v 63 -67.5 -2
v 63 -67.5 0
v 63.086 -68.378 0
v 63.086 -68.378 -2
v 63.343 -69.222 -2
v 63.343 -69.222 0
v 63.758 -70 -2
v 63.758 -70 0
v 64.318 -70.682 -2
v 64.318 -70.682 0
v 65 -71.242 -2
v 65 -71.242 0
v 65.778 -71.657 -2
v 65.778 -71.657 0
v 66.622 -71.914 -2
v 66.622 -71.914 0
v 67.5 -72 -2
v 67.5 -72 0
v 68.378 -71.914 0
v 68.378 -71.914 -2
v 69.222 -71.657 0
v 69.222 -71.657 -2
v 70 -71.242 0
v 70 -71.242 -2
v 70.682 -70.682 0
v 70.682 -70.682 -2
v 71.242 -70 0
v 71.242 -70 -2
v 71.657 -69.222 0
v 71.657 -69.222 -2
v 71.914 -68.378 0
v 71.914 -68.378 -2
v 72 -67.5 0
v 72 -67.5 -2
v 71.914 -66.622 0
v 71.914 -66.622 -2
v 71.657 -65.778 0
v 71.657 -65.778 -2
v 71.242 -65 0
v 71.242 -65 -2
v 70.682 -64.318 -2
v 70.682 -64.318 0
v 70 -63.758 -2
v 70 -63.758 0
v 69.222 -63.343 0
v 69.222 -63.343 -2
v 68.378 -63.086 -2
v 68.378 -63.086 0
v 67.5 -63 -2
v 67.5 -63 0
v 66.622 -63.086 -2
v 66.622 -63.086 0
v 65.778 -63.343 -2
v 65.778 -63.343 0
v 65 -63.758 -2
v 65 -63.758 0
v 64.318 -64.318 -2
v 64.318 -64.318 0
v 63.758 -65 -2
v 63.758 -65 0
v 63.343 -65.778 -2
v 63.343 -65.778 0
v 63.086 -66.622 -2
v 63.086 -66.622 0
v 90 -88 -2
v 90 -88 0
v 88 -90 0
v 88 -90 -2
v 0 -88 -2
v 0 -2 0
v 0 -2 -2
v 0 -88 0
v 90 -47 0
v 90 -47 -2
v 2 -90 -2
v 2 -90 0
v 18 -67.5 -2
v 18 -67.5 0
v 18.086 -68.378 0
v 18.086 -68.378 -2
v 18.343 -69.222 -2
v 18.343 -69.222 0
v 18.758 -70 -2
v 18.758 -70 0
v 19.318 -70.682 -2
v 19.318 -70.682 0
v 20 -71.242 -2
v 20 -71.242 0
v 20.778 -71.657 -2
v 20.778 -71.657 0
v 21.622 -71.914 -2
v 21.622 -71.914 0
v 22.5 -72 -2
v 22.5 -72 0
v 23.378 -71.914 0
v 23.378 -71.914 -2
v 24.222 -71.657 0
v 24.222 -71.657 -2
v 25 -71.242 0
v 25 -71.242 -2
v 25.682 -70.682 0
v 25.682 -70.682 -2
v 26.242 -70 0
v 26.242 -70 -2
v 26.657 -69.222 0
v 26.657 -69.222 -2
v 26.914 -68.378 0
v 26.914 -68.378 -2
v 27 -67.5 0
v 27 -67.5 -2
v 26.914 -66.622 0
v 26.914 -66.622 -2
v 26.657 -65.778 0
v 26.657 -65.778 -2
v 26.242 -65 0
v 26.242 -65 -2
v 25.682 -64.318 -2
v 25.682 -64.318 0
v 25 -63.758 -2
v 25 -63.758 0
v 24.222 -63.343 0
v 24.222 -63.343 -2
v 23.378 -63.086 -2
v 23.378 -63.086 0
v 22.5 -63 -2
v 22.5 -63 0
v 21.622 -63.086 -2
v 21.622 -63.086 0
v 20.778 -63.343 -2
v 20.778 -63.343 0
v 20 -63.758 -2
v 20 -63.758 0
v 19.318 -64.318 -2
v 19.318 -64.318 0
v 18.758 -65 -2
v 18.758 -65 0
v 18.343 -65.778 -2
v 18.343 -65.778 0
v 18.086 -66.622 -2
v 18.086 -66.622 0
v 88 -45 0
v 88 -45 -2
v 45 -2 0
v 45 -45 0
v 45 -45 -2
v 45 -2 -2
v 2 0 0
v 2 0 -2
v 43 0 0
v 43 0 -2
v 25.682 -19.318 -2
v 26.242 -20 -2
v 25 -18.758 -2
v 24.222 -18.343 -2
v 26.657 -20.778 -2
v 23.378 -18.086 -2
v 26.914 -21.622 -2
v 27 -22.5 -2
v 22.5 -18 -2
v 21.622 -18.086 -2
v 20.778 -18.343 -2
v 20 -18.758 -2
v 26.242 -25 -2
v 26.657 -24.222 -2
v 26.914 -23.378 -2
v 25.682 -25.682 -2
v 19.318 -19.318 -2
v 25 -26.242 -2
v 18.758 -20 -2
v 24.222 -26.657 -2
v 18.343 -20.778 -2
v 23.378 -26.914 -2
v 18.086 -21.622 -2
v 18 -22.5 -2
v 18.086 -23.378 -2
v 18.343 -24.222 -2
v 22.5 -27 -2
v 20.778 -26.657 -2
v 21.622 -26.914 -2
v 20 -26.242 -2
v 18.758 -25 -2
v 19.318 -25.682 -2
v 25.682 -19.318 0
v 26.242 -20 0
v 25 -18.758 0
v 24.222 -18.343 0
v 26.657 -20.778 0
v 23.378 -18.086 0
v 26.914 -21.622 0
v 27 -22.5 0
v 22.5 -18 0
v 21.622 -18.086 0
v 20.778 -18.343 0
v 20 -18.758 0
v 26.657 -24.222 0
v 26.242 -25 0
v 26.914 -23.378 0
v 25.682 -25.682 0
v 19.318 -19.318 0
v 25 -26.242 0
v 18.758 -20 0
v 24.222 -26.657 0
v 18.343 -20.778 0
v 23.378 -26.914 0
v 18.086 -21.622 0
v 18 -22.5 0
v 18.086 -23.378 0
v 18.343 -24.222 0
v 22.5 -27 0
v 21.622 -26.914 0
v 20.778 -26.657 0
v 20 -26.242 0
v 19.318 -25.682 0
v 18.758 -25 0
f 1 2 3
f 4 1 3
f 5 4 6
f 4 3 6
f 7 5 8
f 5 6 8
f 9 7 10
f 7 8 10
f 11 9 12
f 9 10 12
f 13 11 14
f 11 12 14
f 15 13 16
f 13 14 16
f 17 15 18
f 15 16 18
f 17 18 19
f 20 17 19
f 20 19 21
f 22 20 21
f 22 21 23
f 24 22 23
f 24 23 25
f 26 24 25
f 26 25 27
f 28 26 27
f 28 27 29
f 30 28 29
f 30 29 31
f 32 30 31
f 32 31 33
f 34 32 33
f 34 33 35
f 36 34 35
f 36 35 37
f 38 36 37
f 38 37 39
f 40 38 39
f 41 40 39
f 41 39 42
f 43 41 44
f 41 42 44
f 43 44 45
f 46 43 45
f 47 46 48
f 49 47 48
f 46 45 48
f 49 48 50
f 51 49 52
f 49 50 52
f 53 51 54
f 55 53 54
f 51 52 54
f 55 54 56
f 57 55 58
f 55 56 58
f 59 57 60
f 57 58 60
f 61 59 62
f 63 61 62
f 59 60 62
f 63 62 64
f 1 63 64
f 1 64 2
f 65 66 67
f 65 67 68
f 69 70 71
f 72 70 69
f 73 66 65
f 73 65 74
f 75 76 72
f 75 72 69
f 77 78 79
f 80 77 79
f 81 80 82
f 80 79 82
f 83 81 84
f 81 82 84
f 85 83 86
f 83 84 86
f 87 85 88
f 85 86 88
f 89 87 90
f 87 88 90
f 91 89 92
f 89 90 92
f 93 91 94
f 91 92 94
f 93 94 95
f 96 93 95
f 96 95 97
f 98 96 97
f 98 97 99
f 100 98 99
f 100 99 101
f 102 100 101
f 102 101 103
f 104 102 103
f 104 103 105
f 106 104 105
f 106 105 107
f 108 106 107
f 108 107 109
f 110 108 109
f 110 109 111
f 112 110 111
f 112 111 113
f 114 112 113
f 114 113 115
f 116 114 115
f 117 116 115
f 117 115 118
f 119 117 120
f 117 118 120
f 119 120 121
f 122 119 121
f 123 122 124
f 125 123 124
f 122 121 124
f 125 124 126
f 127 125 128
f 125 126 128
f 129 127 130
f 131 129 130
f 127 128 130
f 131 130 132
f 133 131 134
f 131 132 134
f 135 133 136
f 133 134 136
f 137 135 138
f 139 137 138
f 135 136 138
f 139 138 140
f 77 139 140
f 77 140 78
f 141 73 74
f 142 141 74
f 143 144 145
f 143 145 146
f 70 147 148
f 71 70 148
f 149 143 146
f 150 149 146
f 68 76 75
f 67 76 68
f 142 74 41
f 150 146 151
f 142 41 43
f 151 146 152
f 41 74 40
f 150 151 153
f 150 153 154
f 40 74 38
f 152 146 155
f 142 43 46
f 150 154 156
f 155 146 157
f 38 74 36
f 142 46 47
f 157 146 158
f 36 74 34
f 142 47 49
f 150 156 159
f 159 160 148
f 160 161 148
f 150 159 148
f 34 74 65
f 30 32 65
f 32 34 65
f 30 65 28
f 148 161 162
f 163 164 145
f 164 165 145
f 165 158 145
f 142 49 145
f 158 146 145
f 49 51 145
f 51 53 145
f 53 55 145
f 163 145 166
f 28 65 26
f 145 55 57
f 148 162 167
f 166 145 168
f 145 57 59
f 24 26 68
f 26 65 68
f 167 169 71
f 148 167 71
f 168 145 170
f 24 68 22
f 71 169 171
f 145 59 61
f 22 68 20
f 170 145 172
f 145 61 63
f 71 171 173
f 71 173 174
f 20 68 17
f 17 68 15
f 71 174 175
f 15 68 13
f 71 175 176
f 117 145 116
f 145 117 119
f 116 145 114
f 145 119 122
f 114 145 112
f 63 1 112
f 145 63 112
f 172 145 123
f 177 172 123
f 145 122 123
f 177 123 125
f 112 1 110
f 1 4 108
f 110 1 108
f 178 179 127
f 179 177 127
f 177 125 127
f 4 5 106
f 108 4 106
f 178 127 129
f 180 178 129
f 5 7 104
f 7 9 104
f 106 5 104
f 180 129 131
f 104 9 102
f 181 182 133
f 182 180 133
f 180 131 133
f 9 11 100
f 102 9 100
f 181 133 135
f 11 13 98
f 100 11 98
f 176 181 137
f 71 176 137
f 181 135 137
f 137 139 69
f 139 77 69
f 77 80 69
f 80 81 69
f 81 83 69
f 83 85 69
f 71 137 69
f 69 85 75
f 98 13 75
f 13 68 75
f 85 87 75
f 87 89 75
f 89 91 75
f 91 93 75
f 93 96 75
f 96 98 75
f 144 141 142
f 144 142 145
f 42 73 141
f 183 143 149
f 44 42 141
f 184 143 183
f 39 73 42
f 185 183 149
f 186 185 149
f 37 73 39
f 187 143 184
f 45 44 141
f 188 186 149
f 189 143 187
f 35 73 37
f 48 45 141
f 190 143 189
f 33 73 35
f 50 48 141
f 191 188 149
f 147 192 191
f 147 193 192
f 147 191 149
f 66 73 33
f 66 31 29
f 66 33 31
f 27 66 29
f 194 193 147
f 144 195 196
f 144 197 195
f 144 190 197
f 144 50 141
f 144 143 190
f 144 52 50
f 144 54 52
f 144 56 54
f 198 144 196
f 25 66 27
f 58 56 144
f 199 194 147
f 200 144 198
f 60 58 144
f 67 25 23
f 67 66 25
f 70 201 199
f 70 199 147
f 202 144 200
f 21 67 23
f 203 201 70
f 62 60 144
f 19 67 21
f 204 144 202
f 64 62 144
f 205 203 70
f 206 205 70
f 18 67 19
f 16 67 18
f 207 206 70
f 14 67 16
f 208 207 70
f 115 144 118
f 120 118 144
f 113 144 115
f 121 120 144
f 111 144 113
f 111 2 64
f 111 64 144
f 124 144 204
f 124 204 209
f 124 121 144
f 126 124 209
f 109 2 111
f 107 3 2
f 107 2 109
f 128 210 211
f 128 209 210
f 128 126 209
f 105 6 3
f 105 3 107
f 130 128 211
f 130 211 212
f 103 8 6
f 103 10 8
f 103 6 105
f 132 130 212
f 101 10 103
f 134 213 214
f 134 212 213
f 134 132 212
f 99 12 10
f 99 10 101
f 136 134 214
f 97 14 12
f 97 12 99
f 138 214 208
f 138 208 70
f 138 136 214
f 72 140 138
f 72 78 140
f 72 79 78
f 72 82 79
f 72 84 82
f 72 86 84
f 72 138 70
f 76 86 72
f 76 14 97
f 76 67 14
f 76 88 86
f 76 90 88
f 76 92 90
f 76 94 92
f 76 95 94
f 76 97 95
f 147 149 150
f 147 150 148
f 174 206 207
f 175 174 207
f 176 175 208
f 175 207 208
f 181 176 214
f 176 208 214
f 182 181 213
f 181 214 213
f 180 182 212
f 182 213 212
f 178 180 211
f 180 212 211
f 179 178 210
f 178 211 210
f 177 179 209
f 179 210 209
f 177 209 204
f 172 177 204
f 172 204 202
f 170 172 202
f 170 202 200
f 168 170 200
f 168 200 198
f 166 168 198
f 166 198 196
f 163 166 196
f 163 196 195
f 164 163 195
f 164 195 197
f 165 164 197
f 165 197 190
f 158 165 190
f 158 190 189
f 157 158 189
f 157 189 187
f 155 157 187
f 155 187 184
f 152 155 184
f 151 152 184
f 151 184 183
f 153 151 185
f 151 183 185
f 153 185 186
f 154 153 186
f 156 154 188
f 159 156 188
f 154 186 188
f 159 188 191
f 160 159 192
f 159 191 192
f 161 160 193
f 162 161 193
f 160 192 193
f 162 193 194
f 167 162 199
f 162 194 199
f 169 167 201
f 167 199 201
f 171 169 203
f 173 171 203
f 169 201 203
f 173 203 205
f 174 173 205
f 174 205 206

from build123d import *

# Parameters (mm, degrees)
EXTRUDE_1_DEPTH   = 2
HOLE_WIZARD_M81_D = 9
CHAMFER_1_SIZE    = 2


with BuildPart() as part:
    # Эскиз1 → Бобышка-Вытянуть1 (new body)
    with BuildSketch(Plane(origin=(0, 0, 0), x_dir=(1, 0, 0), z_dir=(0, 0, -1))):
        Polygon((0, 0), (0, 90), (90, 90), (90, 45), (45, 45), (45, 0), align=None)
    extrude(amount=EXTRUDE_1_DEPTH)

    # Отверстие с зазором M81 (through all)
    with Locations(Plane(origin=(0, 0, -2), x_dir=(1, 0, 0), z_dir=(0, 0, -1))):
        with Locations((22.5, 67.5), (22.5, 22.5), (67.5, 67.5)):
            Hole(HOLE_WIZARD_M81_D / 2)

    # Фаска1
    chamfer_1_edges = [part.edges().sort_by_distance(p)[0] for p in [
        (0, 0, -1),
        (0, -90, -1),
        (90, -90, -1),
        (90, -45, -1),
        (45, 0, -1),
    ]]
    chamfer(chamfer_1_edges, length=CHAMFER_1_SIZE)


solid = part.part
